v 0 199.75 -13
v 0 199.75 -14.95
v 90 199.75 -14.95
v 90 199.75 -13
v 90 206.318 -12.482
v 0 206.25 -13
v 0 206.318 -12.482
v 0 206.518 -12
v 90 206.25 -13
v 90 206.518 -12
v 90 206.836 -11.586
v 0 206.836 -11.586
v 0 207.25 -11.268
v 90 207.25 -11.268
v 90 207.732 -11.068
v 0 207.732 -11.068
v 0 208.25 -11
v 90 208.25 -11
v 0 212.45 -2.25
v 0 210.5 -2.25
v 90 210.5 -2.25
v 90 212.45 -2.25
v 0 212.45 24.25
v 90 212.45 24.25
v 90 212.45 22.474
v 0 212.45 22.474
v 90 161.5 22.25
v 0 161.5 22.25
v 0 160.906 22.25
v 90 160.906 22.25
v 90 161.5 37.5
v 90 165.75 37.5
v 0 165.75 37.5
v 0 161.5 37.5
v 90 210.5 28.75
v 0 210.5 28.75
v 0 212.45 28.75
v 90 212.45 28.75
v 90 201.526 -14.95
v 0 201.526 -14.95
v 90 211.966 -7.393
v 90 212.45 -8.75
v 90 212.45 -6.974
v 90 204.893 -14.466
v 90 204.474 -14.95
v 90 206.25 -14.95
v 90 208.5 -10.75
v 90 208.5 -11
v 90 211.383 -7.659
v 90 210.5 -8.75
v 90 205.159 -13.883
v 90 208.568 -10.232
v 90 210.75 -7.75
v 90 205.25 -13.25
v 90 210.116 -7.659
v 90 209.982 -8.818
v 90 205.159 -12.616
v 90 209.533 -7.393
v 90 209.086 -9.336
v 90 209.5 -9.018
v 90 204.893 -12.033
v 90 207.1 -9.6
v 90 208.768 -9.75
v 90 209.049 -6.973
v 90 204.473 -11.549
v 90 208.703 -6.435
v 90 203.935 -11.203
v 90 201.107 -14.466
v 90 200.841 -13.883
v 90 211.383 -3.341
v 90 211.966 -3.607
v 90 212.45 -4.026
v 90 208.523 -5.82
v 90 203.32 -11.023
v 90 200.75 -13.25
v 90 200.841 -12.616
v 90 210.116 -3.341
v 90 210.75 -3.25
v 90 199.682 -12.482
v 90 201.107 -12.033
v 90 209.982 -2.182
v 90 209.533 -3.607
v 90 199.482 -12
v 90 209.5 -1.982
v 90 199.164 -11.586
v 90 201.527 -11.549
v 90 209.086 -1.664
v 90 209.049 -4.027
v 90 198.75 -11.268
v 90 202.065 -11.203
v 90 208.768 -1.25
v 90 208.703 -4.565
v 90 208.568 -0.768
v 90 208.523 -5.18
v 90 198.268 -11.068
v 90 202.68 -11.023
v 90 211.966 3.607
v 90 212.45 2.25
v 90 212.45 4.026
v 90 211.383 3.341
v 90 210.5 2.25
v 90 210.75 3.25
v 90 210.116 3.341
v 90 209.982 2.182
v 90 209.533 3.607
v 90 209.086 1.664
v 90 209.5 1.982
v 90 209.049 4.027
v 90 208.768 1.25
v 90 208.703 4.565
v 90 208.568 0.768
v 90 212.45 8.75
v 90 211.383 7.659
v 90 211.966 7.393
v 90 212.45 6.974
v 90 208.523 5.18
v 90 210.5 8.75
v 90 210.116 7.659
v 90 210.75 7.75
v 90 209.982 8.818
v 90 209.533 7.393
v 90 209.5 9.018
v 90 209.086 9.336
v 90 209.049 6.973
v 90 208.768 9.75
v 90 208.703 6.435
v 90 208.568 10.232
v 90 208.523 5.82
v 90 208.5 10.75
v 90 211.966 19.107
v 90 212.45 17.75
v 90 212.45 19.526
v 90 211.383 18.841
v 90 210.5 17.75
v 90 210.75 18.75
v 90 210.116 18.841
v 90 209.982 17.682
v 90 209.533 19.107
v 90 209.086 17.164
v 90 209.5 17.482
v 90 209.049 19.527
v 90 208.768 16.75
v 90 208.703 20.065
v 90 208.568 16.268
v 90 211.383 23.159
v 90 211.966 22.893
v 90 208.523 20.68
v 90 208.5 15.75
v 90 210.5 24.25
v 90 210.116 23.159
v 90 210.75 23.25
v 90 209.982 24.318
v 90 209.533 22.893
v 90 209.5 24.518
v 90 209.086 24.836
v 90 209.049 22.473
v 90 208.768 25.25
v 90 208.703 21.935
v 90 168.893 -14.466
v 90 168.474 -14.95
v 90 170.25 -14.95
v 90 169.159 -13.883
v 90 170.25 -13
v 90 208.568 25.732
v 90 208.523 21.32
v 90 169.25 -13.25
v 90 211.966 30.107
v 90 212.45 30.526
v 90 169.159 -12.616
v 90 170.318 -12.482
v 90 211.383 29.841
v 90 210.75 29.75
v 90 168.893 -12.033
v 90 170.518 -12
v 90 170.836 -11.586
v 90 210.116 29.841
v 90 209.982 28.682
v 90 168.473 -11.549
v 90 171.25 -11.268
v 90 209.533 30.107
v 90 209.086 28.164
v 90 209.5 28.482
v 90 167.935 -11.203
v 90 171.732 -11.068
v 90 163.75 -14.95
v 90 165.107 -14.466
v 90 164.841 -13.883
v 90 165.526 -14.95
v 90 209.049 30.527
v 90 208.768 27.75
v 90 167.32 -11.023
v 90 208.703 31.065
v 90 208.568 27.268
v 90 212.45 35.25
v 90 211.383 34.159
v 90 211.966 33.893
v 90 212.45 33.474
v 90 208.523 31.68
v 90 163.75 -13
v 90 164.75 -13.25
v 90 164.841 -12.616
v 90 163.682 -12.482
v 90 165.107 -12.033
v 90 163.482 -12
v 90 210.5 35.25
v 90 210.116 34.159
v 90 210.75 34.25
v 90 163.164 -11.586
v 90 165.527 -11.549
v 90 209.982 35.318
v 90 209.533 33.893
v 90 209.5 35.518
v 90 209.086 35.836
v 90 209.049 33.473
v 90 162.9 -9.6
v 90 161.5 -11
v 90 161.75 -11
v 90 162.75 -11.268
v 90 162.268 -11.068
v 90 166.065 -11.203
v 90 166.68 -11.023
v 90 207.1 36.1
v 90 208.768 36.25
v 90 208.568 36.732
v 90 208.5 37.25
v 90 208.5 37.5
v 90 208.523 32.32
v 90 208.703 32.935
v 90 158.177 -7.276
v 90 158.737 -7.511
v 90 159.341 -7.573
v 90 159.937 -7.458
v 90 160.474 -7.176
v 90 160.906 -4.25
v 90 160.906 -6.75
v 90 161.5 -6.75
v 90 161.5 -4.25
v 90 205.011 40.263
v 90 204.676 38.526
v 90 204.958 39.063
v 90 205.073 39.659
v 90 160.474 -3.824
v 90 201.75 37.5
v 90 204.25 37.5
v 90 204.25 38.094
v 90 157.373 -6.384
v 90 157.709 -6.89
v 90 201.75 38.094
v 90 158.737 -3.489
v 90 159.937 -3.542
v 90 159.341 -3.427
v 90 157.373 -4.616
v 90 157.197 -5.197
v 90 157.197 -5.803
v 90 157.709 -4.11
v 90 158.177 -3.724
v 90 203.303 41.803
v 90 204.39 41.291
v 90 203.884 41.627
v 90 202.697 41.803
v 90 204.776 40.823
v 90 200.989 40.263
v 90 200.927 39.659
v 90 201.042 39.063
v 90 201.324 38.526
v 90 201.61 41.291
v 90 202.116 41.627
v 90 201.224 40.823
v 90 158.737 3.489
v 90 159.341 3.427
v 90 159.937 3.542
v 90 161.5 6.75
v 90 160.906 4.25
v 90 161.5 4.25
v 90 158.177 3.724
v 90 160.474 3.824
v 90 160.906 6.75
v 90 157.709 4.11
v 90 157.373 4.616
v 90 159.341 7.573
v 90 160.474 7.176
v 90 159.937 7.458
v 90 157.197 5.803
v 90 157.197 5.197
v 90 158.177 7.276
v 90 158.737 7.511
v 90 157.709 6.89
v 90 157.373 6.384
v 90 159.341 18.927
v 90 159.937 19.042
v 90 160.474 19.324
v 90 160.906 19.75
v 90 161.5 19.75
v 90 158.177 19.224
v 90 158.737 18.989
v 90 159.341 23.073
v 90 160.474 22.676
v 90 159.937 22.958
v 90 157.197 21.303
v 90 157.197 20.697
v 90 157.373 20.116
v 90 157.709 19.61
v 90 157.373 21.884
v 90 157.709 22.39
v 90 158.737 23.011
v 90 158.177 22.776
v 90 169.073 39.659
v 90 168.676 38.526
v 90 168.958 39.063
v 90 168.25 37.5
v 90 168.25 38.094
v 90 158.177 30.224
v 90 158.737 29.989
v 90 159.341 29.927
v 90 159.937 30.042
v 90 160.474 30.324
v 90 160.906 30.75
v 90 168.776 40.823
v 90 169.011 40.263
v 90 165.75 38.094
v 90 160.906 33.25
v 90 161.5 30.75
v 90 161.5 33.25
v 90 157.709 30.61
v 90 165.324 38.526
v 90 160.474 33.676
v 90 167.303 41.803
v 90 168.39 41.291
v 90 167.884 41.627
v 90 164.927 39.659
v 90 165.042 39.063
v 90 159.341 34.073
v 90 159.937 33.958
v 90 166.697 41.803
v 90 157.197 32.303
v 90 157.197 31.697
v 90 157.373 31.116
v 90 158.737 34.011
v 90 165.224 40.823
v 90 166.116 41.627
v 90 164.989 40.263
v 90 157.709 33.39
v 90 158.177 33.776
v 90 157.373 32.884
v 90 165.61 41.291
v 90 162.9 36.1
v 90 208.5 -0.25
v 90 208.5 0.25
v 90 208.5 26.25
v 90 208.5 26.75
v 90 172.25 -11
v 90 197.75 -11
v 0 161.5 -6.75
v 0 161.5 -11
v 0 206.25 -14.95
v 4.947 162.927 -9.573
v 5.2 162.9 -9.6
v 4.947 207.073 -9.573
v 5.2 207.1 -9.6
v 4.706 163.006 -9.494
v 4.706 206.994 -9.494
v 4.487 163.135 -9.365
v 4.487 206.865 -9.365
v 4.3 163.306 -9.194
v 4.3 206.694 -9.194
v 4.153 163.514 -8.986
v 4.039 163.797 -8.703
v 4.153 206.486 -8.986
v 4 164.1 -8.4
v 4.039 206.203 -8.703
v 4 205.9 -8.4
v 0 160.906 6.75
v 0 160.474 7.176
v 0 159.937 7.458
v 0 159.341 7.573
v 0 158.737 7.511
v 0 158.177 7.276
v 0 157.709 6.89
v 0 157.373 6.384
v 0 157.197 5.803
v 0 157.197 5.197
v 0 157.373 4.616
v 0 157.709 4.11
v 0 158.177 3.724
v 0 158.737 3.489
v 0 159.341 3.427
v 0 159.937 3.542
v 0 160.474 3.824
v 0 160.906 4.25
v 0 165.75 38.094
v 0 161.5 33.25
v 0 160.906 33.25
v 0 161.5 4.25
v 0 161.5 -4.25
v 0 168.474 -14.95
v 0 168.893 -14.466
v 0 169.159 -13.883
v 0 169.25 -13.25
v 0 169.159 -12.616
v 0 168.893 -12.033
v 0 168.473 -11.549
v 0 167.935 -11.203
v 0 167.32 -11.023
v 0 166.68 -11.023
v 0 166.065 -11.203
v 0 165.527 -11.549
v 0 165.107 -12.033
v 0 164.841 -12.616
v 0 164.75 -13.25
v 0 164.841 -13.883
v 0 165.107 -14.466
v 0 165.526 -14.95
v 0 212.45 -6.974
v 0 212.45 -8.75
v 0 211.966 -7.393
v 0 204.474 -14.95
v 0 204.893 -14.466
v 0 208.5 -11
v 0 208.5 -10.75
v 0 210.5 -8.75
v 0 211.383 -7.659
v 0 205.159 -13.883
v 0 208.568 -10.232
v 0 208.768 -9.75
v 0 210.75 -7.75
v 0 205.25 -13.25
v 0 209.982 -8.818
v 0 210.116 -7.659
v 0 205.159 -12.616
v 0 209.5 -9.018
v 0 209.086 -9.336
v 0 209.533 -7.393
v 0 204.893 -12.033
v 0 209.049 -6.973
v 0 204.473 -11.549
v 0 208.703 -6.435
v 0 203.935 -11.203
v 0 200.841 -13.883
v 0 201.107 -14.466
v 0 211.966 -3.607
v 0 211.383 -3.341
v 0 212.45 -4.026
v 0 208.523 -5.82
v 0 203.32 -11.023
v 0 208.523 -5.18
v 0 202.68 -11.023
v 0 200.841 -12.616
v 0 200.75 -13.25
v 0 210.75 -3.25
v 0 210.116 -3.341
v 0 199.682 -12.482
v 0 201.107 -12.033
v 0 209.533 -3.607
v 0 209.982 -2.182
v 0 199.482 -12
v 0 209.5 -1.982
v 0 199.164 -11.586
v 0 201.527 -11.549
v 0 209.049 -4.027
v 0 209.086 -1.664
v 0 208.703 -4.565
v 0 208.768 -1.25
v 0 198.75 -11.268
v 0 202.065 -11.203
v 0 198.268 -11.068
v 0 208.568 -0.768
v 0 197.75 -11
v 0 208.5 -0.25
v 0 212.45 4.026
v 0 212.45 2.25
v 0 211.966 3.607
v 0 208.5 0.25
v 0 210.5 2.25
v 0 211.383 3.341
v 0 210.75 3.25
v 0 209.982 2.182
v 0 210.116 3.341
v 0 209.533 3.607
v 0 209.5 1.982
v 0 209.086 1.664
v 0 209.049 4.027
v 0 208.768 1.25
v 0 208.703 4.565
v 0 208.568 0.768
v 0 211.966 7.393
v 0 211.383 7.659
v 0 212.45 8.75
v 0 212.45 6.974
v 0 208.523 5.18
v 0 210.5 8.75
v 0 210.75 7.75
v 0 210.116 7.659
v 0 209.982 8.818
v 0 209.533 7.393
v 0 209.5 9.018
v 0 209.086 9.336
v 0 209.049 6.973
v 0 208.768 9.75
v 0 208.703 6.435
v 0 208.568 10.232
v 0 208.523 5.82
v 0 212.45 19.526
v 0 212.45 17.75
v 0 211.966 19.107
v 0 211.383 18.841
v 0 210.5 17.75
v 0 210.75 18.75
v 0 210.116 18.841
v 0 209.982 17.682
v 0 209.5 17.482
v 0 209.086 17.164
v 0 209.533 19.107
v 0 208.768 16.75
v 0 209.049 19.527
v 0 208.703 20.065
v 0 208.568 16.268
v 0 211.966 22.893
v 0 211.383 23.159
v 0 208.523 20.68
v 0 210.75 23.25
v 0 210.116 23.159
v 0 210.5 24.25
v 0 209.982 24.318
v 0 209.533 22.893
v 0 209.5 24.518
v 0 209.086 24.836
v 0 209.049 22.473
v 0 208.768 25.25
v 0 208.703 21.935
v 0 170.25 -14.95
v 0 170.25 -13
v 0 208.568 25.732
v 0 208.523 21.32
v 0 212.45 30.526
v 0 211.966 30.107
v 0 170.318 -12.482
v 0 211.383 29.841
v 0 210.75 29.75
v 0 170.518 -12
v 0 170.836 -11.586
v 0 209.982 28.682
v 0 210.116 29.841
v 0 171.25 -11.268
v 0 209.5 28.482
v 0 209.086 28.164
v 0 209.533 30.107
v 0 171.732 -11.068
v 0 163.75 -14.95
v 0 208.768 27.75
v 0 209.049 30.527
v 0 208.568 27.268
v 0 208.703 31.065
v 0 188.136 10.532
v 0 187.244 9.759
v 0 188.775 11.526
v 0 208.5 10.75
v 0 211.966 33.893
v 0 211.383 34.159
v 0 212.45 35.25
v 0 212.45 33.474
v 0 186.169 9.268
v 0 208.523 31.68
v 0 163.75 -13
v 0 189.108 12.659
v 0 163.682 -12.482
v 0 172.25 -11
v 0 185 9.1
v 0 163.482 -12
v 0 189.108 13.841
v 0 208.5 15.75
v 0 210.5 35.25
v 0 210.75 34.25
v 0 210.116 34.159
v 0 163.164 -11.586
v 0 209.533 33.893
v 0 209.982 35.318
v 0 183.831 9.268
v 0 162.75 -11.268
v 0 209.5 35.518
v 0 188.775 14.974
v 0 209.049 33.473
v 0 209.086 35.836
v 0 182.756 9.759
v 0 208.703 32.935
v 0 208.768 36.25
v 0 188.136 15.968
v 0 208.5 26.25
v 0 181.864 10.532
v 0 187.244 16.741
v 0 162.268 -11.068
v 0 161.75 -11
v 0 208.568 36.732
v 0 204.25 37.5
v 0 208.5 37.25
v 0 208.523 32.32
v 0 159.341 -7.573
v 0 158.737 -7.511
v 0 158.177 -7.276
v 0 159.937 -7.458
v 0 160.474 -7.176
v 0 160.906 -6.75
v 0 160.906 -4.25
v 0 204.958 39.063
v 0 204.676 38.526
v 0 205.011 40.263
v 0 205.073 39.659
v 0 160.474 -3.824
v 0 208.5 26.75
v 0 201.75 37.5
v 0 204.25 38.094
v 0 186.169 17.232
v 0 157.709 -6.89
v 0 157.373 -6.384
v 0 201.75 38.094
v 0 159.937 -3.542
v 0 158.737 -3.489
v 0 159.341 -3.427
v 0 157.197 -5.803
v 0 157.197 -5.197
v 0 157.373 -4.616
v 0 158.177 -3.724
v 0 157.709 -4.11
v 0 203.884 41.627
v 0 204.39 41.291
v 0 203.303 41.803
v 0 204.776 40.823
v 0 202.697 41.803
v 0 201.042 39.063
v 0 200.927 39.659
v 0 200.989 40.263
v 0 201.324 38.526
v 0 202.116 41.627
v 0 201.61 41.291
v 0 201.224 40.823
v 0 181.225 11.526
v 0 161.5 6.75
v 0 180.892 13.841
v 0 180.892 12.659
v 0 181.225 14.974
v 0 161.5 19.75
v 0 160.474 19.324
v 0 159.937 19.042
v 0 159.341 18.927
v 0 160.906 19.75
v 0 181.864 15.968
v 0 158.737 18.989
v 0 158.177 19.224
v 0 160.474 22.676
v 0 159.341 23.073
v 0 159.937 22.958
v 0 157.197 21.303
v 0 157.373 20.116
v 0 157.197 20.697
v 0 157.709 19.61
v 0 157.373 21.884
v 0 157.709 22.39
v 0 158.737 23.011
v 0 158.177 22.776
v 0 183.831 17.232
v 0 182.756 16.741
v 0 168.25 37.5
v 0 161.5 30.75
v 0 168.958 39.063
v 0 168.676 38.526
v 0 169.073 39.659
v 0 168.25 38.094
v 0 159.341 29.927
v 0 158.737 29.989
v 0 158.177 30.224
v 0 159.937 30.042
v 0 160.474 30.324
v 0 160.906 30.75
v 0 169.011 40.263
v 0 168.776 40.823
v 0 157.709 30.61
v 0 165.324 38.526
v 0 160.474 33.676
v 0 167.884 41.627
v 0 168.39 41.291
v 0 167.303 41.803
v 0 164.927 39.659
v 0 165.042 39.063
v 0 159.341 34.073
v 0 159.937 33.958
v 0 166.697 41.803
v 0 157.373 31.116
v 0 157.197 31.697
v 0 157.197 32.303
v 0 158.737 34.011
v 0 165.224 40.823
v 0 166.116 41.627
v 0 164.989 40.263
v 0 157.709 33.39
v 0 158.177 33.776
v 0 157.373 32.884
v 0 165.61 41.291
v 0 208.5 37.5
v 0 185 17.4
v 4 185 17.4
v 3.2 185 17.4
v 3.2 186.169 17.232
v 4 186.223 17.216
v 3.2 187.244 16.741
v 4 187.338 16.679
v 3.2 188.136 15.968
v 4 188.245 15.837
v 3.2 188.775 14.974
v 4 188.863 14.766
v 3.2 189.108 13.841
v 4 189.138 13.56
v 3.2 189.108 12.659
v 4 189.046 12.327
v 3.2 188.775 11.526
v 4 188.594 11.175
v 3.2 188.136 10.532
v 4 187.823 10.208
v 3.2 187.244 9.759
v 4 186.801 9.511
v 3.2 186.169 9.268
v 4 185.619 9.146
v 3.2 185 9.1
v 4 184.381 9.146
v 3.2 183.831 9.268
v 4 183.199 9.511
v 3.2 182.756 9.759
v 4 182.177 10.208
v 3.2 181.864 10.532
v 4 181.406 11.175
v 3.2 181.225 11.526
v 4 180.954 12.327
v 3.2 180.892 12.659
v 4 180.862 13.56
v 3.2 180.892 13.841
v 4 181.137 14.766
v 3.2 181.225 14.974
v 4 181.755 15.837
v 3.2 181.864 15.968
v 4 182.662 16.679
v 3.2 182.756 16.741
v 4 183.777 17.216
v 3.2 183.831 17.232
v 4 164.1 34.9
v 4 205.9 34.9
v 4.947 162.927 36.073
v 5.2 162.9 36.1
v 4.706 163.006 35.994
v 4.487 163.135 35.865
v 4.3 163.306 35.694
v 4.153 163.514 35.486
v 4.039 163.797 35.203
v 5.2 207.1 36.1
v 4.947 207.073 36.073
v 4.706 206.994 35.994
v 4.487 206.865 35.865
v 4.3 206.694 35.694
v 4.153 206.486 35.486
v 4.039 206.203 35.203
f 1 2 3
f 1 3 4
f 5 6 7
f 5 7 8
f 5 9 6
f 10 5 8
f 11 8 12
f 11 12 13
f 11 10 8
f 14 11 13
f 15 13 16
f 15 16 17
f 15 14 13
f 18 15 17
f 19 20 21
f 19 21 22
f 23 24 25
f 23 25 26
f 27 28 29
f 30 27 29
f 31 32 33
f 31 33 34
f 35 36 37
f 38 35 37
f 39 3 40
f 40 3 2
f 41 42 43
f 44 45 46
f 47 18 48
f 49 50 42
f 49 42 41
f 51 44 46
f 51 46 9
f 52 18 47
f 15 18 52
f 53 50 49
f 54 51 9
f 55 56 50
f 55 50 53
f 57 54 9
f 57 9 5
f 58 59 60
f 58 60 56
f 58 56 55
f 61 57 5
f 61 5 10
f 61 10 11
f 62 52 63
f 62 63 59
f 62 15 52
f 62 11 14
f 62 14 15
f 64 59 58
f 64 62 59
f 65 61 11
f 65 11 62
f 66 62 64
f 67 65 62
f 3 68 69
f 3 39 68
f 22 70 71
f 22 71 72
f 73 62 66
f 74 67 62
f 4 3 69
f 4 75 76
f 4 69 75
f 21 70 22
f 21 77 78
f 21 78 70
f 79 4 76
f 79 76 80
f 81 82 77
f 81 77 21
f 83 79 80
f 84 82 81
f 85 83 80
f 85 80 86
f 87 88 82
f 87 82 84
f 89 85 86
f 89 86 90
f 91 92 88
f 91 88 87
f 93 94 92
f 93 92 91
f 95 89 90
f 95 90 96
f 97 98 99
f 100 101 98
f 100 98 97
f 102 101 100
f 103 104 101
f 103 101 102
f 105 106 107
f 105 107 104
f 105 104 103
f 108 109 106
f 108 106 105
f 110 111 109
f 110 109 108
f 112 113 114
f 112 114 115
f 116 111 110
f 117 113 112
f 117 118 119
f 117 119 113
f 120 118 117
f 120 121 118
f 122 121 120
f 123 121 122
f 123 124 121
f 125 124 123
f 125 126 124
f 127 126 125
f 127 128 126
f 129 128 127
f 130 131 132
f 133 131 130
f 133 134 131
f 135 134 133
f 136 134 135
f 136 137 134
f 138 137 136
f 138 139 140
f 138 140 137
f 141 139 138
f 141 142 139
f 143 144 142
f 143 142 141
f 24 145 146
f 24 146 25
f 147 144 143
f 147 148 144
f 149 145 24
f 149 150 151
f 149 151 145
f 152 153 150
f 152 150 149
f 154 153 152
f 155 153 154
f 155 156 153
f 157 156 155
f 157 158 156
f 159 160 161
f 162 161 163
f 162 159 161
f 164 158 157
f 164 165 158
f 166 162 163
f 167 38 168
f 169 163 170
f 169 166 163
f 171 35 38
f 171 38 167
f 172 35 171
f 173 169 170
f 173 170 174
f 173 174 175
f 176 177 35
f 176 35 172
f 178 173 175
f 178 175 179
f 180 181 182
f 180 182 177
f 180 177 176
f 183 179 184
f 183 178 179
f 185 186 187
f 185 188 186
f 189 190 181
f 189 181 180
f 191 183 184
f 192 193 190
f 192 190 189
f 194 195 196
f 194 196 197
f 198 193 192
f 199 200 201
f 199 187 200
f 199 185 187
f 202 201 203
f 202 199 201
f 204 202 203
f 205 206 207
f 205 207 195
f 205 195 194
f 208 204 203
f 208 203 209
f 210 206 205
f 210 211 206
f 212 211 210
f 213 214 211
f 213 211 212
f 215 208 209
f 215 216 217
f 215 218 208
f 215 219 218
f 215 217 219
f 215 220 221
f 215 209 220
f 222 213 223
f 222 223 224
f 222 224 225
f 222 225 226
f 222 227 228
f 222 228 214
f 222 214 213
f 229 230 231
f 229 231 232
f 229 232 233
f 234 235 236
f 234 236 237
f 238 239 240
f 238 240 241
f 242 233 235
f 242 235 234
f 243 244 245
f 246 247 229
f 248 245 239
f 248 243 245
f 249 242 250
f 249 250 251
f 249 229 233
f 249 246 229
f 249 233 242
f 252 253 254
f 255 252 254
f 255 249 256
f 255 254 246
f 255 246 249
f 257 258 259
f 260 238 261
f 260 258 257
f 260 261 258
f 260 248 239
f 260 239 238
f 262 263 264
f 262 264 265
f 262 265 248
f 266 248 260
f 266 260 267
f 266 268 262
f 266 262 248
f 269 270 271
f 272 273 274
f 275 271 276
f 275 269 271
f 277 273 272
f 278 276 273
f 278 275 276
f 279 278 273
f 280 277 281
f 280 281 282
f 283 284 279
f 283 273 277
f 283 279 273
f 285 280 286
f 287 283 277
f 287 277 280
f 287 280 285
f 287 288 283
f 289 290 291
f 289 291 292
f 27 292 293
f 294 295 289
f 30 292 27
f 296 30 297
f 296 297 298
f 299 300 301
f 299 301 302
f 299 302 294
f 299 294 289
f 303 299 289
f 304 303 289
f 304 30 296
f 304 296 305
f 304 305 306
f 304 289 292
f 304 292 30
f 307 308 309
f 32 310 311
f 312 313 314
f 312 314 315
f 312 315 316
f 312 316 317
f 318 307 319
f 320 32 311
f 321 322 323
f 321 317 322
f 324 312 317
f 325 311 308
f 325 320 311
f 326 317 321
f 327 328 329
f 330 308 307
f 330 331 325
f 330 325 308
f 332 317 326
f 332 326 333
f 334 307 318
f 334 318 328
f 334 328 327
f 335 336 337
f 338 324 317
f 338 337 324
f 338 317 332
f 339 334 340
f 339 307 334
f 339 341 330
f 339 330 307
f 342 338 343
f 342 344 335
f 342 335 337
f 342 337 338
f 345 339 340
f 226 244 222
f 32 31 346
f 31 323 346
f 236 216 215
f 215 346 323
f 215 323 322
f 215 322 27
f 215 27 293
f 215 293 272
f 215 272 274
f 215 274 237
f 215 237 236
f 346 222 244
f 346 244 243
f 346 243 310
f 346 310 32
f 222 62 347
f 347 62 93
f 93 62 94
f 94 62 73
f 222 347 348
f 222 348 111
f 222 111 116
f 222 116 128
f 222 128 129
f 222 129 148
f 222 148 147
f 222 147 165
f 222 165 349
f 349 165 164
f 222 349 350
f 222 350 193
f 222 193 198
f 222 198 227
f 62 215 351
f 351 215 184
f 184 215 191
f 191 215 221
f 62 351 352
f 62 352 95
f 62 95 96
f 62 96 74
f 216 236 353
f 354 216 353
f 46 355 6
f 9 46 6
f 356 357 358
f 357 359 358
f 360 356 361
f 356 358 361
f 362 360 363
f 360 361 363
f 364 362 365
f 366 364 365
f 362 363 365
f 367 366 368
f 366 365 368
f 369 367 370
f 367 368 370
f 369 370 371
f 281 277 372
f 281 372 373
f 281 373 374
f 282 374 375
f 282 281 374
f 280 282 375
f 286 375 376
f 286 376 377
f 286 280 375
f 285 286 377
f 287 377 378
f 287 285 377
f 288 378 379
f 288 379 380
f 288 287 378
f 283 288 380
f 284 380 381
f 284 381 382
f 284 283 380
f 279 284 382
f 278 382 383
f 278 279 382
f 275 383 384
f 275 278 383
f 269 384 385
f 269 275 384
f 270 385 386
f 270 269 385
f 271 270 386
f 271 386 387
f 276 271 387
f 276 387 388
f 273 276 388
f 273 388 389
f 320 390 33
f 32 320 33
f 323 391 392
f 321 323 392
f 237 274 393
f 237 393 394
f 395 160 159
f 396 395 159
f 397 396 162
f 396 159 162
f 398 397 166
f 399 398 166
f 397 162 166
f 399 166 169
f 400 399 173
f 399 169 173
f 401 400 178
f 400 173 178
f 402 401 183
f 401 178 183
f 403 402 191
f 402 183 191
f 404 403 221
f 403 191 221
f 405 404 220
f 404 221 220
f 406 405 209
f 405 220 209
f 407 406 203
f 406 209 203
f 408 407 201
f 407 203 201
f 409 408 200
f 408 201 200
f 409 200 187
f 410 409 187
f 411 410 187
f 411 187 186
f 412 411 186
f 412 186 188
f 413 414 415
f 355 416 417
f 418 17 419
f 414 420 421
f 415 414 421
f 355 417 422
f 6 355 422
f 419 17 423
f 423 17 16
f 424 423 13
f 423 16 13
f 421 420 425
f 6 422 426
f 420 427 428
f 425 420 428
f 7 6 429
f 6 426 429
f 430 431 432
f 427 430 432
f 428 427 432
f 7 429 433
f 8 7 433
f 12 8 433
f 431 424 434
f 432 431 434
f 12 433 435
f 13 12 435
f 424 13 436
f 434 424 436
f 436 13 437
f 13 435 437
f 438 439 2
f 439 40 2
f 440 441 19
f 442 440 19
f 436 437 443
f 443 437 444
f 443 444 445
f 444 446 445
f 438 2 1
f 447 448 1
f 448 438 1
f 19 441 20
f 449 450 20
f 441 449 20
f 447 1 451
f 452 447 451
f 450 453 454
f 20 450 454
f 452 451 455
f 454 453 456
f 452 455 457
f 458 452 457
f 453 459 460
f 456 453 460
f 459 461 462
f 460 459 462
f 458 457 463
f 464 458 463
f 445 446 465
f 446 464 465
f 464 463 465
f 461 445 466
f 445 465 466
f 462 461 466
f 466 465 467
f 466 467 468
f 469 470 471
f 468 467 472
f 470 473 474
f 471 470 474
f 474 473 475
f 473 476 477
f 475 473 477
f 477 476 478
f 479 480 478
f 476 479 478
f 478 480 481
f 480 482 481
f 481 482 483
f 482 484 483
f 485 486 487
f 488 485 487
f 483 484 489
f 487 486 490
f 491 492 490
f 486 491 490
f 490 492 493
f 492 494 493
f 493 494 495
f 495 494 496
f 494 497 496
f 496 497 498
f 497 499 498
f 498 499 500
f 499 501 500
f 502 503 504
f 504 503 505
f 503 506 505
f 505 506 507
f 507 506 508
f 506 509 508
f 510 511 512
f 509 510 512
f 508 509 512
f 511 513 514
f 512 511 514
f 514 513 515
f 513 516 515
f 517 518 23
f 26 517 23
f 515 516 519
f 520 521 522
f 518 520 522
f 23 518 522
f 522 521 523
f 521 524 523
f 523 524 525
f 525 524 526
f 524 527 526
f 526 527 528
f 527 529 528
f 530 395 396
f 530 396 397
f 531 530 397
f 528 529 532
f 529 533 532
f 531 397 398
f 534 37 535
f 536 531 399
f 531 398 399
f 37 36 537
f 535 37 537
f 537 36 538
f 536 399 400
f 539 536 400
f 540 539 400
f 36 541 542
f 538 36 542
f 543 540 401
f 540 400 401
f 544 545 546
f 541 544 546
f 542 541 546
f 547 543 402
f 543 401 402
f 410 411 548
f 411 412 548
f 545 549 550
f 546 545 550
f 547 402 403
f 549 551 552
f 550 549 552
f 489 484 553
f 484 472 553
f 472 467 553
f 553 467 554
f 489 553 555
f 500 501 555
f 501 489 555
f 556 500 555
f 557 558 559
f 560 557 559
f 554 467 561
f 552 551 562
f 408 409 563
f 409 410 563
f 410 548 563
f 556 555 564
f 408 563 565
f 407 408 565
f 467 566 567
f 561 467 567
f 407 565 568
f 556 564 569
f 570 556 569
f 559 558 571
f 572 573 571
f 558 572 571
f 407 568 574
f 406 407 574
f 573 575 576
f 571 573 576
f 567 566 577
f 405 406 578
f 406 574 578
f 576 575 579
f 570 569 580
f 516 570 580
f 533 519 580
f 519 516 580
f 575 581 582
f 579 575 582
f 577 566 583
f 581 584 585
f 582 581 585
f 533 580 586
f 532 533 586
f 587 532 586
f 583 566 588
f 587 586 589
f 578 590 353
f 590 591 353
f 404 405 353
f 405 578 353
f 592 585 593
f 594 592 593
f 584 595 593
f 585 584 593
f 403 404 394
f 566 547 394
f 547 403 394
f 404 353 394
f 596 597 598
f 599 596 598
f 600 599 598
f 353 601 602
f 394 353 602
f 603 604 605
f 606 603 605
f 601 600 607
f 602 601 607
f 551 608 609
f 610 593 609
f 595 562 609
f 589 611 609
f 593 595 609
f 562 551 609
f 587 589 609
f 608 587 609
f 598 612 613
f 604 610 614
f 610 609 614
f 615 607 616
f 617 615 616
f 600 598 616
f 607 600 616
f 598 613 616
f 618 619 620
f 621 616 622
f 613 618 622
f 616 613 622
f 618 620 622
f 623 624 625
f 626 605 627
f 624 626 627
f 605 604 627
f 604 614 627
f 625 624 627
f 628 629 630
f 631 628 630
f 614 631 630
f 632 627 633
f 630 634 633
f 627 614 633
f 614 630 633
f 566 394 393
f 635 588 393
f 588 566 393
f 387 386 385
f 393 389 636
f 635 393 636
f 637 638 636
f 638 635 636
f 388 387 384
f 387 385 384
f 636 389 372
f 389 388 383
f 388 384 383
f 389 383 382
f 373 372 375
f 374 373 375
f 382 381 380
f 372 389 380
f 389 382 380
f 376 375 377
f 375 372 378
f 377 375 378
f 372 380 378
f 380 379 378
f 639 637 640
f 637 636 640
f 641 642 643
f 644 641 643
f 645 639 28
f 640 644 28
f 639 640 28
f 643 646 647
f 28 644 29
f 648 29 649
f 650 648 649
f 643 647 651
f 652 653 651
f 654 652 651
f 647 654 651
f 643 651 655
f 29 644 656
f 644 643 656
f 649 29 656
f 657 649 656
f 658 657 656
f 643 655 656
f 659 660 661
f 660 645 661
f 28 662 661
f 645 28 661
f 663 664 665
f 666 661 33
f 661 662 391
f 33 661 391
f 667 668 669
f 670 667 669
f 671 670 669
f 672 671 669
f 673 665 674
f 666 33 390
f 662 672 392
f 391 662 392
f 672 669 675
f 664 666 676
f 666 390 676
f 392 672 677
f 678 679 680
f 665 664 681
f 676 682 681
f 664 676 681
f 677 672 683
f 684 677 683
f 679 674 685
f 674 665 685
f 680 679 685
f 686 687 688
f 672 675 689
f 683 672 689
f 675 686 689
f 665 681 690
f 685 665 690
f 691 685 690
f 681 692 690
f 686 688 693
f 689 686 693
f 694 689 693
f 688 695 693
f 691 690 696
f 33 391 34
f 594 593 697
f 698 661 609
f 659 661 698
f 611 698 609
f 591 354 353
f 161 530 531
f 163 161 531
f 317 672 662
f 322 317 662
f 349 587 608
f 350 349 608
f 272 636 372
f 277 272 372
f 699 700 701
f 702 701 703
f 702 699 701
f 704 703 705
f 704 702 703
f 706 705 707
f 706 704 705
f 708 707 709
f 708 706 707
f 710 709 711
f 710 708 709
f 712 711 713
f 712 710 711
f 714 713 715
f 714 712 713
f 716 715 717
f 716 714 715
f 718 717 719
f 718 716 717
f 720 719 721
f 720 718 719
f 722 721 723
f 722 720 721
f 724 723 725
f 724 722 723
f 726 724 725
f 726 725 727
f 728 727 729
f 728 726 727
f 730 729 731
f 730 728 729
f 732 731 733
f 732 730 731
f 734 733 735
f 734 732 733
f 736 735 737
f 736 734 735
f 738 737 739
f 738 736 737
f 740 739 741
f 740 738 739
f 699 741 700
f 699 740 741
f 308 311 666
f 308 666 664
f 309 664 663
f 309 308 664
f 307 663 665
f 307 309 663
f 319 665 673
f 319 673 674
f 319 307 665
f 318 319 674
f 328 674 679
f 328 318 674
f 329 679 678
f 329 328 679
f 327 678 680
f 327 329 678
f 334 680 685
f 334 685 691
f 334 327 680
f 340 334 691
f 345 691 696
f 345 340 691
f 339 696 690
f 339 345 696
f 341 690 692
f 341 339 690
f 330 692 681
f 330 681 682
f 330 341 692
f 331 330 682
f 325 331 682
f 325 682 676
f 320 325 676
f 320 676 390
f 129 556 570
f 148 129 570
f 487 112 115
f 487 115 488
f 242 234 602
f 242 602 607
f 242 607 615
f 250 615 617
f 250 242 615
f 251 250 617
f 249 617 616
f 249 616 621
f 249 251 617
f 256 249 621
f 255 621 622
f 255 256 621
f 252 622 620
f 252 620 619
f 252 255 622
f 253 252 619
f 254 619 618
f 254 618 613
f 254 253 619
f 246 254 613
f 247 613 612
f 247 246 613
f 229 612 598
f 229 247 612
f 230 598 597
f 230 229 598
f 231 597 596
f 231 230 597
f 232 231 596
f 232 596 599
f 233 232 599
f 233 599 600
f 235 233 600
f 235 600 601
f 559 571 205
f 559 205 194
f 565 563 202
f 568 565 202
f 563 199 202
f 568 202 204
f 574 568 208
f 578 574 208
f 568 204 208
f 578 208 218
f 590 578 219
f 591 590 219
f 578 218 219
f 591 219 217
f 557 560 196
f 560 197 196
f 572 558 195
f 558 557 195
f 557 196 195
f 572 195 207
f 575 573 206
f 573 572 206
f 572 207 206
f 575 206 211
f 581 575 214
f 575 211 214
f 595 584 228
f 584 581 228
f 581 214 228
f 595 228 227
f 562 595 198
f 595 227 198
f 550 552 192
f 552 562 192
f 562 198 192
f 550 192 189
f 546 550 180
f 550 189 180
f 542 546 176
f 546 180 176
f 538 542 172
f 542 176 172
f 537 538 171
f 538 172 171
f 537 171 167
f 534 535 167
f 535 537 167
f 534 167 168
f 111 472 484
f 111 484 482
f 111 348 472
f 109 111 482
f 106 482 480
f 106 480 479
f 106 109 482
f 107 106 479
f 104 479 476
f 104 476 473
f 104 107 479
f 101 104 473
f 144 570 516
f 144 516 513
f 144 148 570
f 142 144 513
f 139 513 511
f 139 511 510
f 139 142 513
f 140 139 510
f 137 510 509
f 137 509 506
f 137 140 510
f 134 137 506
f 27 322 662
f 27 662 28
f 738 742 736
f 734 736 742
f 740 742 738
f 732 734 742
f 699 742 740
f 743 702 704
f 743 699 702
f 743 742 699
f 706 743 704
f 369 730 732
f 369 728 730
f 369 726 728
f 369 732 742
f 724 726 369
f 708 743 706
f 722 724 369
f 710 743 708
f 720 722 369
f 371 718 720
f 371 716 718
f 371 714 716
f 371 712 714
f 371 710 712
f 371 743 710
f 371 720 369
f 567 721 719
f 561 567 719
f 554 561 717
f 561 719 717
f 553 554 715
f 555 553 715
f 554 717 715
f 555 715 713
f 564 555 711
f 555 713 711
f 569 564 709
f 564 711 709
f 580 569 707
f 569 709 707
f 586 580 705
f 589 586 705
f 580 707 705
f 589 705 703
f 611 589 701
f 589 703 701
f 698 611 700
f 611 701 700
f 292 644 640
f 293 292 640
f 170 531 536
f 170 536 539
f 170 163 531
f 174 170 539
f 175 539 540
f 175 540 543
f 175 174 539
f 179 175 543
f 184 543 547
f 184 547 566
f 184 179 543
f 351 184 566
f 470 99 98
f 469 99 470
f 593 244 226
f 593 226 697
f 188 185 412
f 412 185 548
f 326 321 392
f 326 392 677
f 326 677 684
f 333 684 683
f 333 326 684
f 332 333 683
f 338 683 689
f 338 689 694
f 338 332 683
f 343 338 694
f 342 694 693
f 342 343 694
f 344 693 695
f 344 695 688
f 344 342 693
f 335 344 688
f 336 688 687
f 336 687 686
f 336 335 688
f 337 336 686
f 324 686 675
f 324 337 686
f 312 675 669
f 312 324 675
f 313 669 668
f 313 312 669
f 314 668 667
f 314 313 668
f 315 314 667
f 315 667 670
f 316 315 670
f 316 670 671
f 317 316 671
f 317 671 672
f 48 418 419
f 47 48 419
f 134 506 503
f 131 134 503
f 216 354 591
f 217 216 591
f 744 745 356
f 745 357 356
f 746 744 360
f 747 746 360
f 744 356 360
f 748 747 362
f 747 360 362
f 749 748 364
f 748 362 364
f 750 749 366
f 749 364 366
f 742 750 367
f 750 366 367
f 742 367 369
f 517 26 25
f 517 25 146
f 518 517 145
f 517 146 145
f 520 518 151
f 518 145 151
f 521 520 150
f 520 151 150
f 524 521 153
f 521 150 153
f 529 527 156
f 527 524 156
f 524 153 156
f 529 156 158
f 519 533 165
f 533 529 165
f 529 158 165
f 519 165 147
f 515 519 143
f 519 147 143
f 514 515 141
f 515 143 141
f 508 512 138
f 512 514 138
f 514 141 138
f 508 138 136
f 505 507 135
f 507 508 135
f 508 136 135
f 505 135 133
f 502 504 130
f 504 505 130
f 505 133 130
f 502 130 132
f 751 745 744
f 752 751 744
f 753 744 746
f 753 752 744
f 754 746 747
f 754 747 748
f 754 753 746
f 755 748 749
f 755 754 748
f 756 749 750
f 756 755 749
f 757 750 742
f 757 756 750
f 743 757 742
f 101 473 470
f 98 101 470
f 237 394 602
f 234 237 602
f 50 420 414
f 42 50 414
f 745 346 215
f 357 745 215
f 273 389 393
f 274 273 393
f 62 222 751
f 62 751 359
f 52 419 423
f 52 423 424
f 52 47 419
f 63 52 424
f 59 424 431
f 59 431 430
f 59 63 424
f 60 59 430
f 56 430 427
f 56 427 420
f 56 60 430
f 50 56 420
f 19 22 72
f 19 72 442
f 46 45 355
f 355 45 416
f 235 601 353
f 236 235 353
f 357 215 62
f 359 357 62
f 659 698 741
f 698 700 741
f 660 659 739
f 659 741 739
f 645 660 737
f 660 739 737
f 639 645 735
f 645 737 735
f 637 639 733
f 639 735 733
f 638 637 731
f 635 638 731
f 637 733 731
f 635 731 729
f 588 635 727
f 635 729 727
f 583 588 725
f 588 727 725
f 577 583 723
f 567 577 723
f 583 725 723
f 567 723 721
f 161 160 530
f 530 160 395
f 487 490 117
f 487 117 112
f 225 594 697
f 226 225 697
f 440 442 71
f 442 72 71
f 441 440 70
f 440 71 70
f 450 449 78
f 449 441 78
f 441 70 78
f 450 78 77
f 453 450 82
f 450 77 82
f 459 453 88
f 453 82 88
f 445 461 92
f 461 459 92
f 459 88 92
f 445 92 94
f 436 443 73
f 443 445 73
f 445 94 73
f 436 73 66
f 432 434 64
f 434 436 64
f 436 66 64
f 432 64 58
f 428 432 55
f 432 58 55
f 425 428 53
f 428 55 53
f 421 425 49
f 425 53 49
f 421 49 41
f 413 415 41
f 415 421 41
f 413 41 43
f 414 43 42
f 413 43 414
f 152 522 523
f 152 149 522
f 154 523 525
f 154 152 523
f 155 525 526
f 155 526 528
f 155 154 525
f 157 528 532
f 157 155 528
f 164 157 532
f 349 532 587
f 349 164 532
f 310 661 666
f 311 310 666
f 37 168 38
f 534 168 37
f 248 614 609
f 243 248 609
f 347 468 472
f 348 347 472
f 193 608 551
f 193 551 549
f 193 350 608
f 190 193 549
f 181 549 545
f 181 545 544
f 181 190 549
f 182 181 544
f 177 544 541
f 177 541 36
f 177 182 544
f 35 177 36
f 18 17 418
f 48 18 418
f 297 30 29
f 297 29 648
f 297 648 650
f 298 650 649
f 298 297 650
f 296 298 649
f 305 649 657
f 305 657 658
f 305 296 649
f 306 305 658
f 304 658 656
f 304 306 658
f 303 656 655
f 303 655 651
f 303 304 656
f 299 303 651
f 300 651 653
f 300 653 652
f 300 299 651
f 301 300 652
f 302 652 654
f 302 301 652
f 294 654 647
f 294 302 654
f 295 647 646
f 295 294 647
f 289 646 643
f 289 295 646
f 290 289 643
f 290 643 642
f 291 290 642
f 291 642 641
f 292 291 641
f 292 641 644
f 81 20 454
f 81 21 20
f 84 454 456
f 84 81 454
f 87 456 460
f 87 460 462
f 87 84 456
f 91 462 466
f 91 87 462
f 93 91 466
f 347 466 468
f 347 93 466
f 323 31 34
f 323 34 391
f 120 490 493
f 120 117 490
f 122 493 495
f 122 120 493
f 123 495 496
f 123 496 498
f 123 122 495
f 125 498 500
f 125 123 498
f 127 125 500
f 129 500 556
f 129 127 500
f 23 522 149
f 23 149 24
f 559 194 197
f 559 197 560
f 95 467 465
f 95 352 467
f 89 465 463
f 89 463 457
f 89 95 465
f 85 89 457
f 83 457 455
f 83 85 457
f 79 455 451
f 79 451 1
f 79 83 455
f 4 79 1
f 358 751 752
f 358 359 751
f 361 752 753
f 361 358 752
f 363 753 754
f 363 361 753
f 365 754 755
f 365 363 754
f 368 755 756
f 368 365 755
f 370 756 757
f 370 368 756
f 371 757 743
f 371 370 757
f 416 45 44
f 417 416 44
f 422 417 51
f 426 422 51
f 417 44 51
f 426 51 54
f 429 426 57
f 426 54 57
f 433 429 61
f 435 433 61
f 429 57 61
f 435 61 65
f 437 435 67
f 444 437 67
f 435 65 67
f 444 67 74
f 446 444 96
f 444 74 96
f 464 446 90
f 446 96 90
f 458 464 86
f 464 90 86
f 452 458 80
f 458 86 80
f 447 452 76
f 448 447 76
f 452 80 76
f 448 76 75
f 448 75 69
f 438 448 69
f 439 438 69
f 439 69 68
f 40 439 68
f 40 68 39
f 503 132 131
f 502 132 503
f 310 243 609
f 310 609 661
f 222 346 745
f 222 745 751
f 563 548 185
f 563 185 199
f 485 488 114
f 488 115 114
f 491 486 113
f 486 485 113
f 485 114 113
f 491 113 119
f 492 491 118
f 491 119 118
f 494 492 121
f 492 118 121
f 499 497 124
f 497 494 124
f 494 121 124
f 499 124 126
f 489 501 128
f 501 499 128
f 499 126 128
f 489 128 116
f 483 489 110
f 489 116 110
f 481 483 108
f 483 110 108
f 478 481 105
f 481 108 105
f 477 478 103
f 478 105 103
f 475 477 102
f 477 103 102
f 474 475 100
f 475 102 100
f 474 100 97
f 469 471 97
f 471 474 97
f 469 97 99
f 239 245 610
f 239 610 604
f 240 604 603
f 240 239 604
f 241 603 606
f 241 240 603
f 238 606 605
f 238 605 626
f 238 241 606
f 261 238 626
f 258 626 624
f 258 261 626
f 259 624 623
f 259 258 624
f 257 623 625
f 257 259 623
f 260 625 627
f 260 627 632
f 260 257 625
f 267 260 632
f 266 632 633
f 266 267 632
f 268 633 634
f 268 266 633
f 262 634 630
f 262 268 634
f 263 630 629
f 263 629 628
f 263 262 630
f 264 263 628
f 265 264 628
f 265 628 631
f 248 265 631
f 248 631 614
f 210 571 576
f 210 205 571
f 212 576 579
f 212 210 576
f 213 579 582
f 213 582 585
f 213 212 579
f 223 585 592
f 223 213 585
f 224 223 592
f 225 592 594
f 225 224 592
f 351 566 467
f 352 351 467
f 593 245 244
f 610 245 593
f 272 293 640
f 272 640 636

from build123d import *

# Parameters (mm, degrees)
EXTRUDE_1_DEPTH             = 90
SKETCH_2_W                  = 90
SKETCH_2_H                  = 42.75
EXTRUDE_2_DEPTH             = 8.2
SKETCH_3_W                  = 90
SKETCH_3_H                  = 52.45
EXTRUDE_3_DEPTH             = 8.2
SKETCH_4_W                  = 3.95
SKETCH_4_H                  = 2.25
CUT_EXTRUDE_1_DEPTH         = 235.487383722
SKETCH_5_W                  = 3.95
SKETCH_5_H                  = 29.5
CUT_EXTRUDE_2_DEPTH         = 235.487383722
SKETCH_6_W                  = 3.95
SKETCH_6_H                  = 6.2
CUT_EXTRUDE_3_DEPTH         = 235.487383722
SKETCH_7_W                  = 2.25
SKETCH_7_H                  = 3.95
CUT_EXTRUDE_4_DEPTH         = 235.487383722
SKETCH_8_W                  = 4.5
SKETCH_8_H                  = 3.95
CUT_EXTRUDE_5_DEPTH         = 235.487383722
SKETCH_9_W                  = 9
SKETCH_9_H                  = 3.95
CUT_EXTRUDE_6_DEPTH         = 235.487383722
SKETCH_10_W                 = 4.5
SKETCH_10_H                 = 3.95
CUT_EXTRUDE_7_DEPTH         = 235.487383722
SKETCH_11_W                 = 2.25
SKETCH_11_H                 = 3.95
CUT_EXTRUDE_8_DEPTH         = 235.487383722
SKETCH_12_W                 = 45.7
SKETCH_12_H                 = 44.2
CUT_EXTRUDE_9_DEPTH         = 86
HOLE_WIZARD_2_5_2_5_1_D     = 2.5
HOLE_WIZARD_4_5_4_5_1_D     = 4.5
HOLE_WIZARD_8_3_8_3_1_D     = 8.3
HOLE_WIZARD_8_3_8_3_1_DEPTH = 3.2
SKETCH_19_R                 = 1.67252853
SKETCH_19_R_2               = 1.459159852
SKETCH_19_R_3               = 1.459908976
SKETCH_19_R_4               = 1.592821911
SKETCH_19_R_5               = 1.532216665
SKETCH_19_R_6               = 1.596138091
EXTRUDE_4_DEPTH             = 90
CUT_EXTRUDE_START           = -90
SKETCH_20_R                 = 4.15
CUT_EXTRUDE_10_DEPTH        = 90
FILLET_1_R                  = 2
FILLET_2_R                  = 2
FILLET_3_R                  = 2
FILLET_4_R                  = 2
FILLET_5_R                  = 2
FILLET_6_R                  = 2
FILLET_7_R                  = 2
FILLET_8_R                  = 2
FILLET_9_R                  = 2
FILLET_10_R                 = 2
FILLET_11_R                 = 2
FILLET_12_R                 = 2
FILLET_13_R                 = 1.2


with BuildPart() as part:
    # Эскиз1 → Бобышка-Вытянуть1 (new body)
    with BuildSketch(Plane(origin=(90, 0, 0), x_dir=(0, 0, -1), z_dir=(1, 0, 0))):
        with BuildLine():
            Line((6.75, 160.906238208), (6.75, 204.25))
            Line((6.75, 204.25), (-38.093761792, 204.25))
            ThreePointArc((-38.093761792, 204.25), (-41.825, 203), (-38.093761792, 201.75))
            Line((-38.093761792, 201.75), (-37.5, 201.75))
            Line((-37.5, 201.75), (-37.5, 168.25))
            Line((-37.5, 168.25), (-38.093761792, 168.25))
            ThreePointArc((-38.093761792, 168.25), (-41.825, 167), (-38.093761792, 165.75))
            Line((-38.093761792, 165.75), (-37.5, 165.75))
            Line((-37.5, 165.75), (-37.5, 161.5))
            Line((-37.5, 161.5), (-33.25, 161.5))
            Line((-33.25, 161.5), (-33.25, 160.906238208))
            ThreePointArc((-33.25, 160.906238208), (-32, 157.175), (-30.75, 160.906238208))
            Line((-30.75, 160.906238208), (-30.75, 161.5))
            Line((-30.75, 161.5), (-22.25, 161.5))
            Line((-22.25, 161.5), (-22.25, 160.906238208))
            ThreePointArc((-22.25, 160.906238208), (-21, 157.175), (-19.75, 160.906238208))
            Line((-19.75, 160.906238208), (-19.75, 161.5))
            Line((-19.75, 161.5), (-6.75, 161.5))
            Line((-6.75, 161.5), (-6.75, 160.906238208))
            ThreePointArc((-6.75, 160.906238208), (-5.5, 157.175), (-4.25, 160.906238208))
            Line((-4.25, 160.906238208), (-4.25, 161.5))
            Line((-4.25, 161.5), (4.25, 161.5))
            Line((4.25, 161.5), (4.25, 160.906238208))
            ThreePointArc((4.25, 160.906238208), (5.5, 157.175), (6.75, 160.906238208))
        make_face()
    extrude(amount=-EXTRUDE_1_DEPTH)

    # Эскиз2 → Бобышка-Вытянуть2 (add)
    with BuildSketch(Plane(origin=(0, 0, -6.75), x_dir=(-1, 0, 0), z_dir=(0, 0, -1))):
        with Locations((-45, 182.875)):
            Rectangle(SKETCH_2_W, SKETCH_2_H)
    extrude(amount=EXTRUDE_2_DEPTH)

    # Эскиз3 → Бобышка-Вытянуть3 (add)
    with BuildSketch(Plane(origin=(0, 204.25, 0), x_dir=(-1, 0, 0), z_dir=(0, 1, 0))):
        with Locations((-45, 11.275)):
            Rectangle(SKETCH_3_W, SKETCH_3_H)
    extrude(amount=EXTRUDE_3_DEPTH)

    # Эскиз4 → Вырез-Вытянуть1 (cut, through all)
    with BuildSketch(Plane.ZY):
        with Locations((-12.975, 162.625)):
            Rectangle(SKETCH_4_W, SKETCH_4_H)
    extrude(amount=-CUT_EXTRUDE_1_DEPTH, mode=Mode.SUBTRACT)

    # Эскиз5 → Вырез-Вытянуть2 (cut, through all)
    with BuildSketch(Plane.ZY):
        with Locations((-12.975, 185)):
            Rectangle(SKETCH_5_W, SKETCH_5_H)
    extrude(amount=-CUT_EXTRUDE_2_DEPTH, mode=Mode.SUBTRACT)

    # Эскиз6 → Вырез-Вытянуть3 (cut, through all)
    with BuildSketch(Plane.ZY):
        with Locations((-12.975, 209.35)):
            Rectangle(SKETCH_6_W, SKETCH_6_H)
    extrude(amount=-CUT_EXTRUDE_3_DEPTH, mode=Mode.SUBTRACT)

    # Эскиз7 → Вырез-Вытянуть4 (cut, through all)
    with BuildSketch(Plane.ZY):
        with Locations((-9.875, 210.475)):
            Rectangle(SKETCH_7_W, SKETCH_7_H)
    extrude(amount=-CUT_EXTRUDE_4_DEPTH, mode=Mode.SUBTRACT)

    # Эскиз8 → Вырез-Вытянуть5 (cut, through all)
    with BuildSketch(Plane.ZY):
        with Locations((0, 210.475)):
            Rectangle(SKETCH_8_W, SKETCH_8_H)
    extrude(amount=-CUT_EXTRUDE_5_DEPTH, mode=Mode.SUBTRACT)

    # Эскиз9 → Вырез-Вытянуть6 (cut, through all)
    with BuildSketch(Plane.ZY):
        with Locations((13.25, 210.475)):
            Rectangle(SKETCH_9_W, SKETCH_9_H)
    extrude(amount=-CUT_EXTRUDE_6_DEPTH, mode=Mode.SUBTRACT)

    # Эскиз10 → Вырез-Вытянуть7 (cut, through all)
    with BuildSketch(Plane.ZY):
        with Locations((26.5, 210.475)):
            Rectangle(SKETCH_10_W, SKETCH_10_H)
    extrude(amount=-CUT_EXTRUDE_7_DEPTH, mode=Mode.SUBTRACT)

    # Эскиз11 → Вырез-Вытянуть8 (cut, through all)
    with BuildSketch(Plane.ZY):
        with Locations((36.375, 210.475)):
            Rectangle(SKETCH_11_W, SKETCH_11_H)
    extrude(amount=-CUT_EXTRUDE_8_DEPTH, mode=Mode.SUBTRACT)

    # Эскиз12 → Вырез-Вытянуть9 (cut)
    with BuildSketch(Plane(origin=(90, 0, 0), x_dir=(0, 0, -1), z_dir=(1, 0, 0))):
        with Locations((-13.25, 185)):
            Rectangle(SKETCH_12_W, SKETCH_12_H)
    extrude(amount=-CUT_EXTRUDE_9_DEPTH, mode=Mode.SUBTRACT)

    # Диаметр отверстия Ø2.5 (2.5)1 (through all)
    with Locations(Plane(origin=(90, 0, 0), x_dir=(0, 0, -1), z_dir=(1, 0, 0))):
        with Locations((5.5, 159.25), (-21, 159.25), (-5.5, 159.25), (-32, 159.25), (-39.75, 167), (-39.75, 203)):
            Hole(HOLE_WIZARD_2_5_2_5_1_D / 2)

    # Диаметр отверстия Ø4.5 (4.5)1 (through all)
    with Locations(Plane.ZY):
        with Locations((-13.25, 167), (-13.25, 203), (-5.5, 210.75), (5.5, 210.75), (21, 210.75), (32, 210.75)):
            Hole(HOLE_WIZARD_4_5_4_5_1_D / 2)

    # Диаметр отверстия Ø8.3 (8.3)1
    with Locations(Plane.ZY):
        with Locations((13.25, 185)):
            Hole(HOLE_WIZARD_8_3_8_3_1_D / 2, depth=HOLE_WIZARD_8_3_8_3_1_DEPTH)

    # Эскиз19 → Бобышка-Вытянуть4 (add)
    with BuildSketch(Plane(origin=(90, 0, 0), x_dir=(0, 0, -1), z_dir=(1, 0, 0))):
        with Locations((-39.75, 203)):
            Circle(SKETCH_19_R)
        with Locations((-39.75, 167)):
            Circle(SKETCH_19_R_2)
        with Locations((-32, 159.25)):
            Circle(SKETCH_19_R_3)
        with Locations((-21, 159.25)):
            Circle(SKETCH_19_R_4)
        with Locations((-5.5, 159.25)):
            Circle(SKETCH_19_R_5)
        with Locations((5.5, 159.25)):
            Circle(SKETCH_19_R_6)
    extrude(amount=-EXTRUDE_4_DEPTH)

    # Эскиз20 → Вырез-Вытянуть10 (cut)
    with BuildSketch(Plane.ZY.offset(CUT_EXTRUDE_START)):
        with Locations((13.25, 185)):
            Circle(SKETCH_20_R)
    extrude(amount=CUT_EXTRUDE_10_DEPTH, mode=Mode.SUBTRACT)

    # Скругление1
    fillet_1_edges = [part.edges().sort_by_distance(p)[0] for p in [
        (45, 208.5, -8.75),
    ]]
    fillet(fillet_1_edges, radius=FILLET_1_R)

    # Скругление2
    fillet_2_edges = [part.edges().sort_by_distance(p)[0] for p in [
        (45, 163.75, -11),
    ]]
    fillet(fillet_2_edges, radius=FILLET_2_R)

    # Скругление3
    fillet_3_edges = [part.edges().sort_by_distance(p)[0] for p in [
        (45, 170.25, -11),
    ]]
    fillet(fillet_3_edges, radius=FILLET_3_R)

    # Скругление4
    fillet_4_edges = [part.edges().sort_by_distance(p)[0] for p in [
        (45, 199.75, -11),
    ]]
    fillet(fillet_4_edges, radius=FILLET_4_R)

    # Скругление5
    fillet_5_edges = [part.edges().sort_by_distance(p)[0] for p in [
        (45, 206.25, -11),
    ]]
    fillet(fillet_5_edges, radius=FILLET_5_R)

    # Скругление6
    fillet_6_edges = [part.edges().sort_by_distance(p)[0] for p in [
        (45, 208.5, -2.25),
    ]]
    fillet(fillet_6_edges, radius=FILLET_6_R)

    # Скругление7
    fillet_7_edges = [part.edges().sort_by_distance(p)[0] for p in [
        (45, 208.5, 2.25),
    ]]
    fillet(fillet_7_edges, radius=FILLET_7_R)

    # Скругление8
    fillet_8_edges = [part.edges().sort_by_distance(p)[0] for p in [
        (45, 208.5, 8.75),
    ]]
    fillet(fillet_8_edges, radius=FILLET_8_R)

    # Скругление9
    fillet_9_edges = [part.edges().sort_by_distance(p)[0] for p in [
        (45, 208.5, 17.75),
    ]]
    fillet(fillet_9_edges, radius=FILLET_9_R)

    # Скругление10
    fillet_10_edges = [part.edges().sort_by_distance(p)[0] for p in [
        (45, 208.5, 24.25),
    ]]
    fillet(fillet_10_edges, radius=FILLET_10_R)

    # Скругление11
    fillet_11_edges = [part.edges().sort_by_distance(p)[0] for p in [
        (45, 208.5, 28.75),
    ]]
    fillet(fillet_11_edges, radius=FILLET_11_R)

    # Скругление12
    fillet_12_edges = [part.edges().sort_by_distance(p)[0] for p in [
        (45, 208.5, 35.25),
    ]]
    fillet(fillet_12_edges, radius=FILLET_12_R)

    # Скругление13
    fillet_13_edges = [part.edges().sort_by_distance(p)[0] for p in [
        (4, 185, -9.6),
        (4, 162.9, 13.25),
        (4, 185, 36.1),
        (4, 207.1, 13.25),
    ]]
    fillet(fillet_13_edges, radius=FILLET_13_R)


solid = part.part
